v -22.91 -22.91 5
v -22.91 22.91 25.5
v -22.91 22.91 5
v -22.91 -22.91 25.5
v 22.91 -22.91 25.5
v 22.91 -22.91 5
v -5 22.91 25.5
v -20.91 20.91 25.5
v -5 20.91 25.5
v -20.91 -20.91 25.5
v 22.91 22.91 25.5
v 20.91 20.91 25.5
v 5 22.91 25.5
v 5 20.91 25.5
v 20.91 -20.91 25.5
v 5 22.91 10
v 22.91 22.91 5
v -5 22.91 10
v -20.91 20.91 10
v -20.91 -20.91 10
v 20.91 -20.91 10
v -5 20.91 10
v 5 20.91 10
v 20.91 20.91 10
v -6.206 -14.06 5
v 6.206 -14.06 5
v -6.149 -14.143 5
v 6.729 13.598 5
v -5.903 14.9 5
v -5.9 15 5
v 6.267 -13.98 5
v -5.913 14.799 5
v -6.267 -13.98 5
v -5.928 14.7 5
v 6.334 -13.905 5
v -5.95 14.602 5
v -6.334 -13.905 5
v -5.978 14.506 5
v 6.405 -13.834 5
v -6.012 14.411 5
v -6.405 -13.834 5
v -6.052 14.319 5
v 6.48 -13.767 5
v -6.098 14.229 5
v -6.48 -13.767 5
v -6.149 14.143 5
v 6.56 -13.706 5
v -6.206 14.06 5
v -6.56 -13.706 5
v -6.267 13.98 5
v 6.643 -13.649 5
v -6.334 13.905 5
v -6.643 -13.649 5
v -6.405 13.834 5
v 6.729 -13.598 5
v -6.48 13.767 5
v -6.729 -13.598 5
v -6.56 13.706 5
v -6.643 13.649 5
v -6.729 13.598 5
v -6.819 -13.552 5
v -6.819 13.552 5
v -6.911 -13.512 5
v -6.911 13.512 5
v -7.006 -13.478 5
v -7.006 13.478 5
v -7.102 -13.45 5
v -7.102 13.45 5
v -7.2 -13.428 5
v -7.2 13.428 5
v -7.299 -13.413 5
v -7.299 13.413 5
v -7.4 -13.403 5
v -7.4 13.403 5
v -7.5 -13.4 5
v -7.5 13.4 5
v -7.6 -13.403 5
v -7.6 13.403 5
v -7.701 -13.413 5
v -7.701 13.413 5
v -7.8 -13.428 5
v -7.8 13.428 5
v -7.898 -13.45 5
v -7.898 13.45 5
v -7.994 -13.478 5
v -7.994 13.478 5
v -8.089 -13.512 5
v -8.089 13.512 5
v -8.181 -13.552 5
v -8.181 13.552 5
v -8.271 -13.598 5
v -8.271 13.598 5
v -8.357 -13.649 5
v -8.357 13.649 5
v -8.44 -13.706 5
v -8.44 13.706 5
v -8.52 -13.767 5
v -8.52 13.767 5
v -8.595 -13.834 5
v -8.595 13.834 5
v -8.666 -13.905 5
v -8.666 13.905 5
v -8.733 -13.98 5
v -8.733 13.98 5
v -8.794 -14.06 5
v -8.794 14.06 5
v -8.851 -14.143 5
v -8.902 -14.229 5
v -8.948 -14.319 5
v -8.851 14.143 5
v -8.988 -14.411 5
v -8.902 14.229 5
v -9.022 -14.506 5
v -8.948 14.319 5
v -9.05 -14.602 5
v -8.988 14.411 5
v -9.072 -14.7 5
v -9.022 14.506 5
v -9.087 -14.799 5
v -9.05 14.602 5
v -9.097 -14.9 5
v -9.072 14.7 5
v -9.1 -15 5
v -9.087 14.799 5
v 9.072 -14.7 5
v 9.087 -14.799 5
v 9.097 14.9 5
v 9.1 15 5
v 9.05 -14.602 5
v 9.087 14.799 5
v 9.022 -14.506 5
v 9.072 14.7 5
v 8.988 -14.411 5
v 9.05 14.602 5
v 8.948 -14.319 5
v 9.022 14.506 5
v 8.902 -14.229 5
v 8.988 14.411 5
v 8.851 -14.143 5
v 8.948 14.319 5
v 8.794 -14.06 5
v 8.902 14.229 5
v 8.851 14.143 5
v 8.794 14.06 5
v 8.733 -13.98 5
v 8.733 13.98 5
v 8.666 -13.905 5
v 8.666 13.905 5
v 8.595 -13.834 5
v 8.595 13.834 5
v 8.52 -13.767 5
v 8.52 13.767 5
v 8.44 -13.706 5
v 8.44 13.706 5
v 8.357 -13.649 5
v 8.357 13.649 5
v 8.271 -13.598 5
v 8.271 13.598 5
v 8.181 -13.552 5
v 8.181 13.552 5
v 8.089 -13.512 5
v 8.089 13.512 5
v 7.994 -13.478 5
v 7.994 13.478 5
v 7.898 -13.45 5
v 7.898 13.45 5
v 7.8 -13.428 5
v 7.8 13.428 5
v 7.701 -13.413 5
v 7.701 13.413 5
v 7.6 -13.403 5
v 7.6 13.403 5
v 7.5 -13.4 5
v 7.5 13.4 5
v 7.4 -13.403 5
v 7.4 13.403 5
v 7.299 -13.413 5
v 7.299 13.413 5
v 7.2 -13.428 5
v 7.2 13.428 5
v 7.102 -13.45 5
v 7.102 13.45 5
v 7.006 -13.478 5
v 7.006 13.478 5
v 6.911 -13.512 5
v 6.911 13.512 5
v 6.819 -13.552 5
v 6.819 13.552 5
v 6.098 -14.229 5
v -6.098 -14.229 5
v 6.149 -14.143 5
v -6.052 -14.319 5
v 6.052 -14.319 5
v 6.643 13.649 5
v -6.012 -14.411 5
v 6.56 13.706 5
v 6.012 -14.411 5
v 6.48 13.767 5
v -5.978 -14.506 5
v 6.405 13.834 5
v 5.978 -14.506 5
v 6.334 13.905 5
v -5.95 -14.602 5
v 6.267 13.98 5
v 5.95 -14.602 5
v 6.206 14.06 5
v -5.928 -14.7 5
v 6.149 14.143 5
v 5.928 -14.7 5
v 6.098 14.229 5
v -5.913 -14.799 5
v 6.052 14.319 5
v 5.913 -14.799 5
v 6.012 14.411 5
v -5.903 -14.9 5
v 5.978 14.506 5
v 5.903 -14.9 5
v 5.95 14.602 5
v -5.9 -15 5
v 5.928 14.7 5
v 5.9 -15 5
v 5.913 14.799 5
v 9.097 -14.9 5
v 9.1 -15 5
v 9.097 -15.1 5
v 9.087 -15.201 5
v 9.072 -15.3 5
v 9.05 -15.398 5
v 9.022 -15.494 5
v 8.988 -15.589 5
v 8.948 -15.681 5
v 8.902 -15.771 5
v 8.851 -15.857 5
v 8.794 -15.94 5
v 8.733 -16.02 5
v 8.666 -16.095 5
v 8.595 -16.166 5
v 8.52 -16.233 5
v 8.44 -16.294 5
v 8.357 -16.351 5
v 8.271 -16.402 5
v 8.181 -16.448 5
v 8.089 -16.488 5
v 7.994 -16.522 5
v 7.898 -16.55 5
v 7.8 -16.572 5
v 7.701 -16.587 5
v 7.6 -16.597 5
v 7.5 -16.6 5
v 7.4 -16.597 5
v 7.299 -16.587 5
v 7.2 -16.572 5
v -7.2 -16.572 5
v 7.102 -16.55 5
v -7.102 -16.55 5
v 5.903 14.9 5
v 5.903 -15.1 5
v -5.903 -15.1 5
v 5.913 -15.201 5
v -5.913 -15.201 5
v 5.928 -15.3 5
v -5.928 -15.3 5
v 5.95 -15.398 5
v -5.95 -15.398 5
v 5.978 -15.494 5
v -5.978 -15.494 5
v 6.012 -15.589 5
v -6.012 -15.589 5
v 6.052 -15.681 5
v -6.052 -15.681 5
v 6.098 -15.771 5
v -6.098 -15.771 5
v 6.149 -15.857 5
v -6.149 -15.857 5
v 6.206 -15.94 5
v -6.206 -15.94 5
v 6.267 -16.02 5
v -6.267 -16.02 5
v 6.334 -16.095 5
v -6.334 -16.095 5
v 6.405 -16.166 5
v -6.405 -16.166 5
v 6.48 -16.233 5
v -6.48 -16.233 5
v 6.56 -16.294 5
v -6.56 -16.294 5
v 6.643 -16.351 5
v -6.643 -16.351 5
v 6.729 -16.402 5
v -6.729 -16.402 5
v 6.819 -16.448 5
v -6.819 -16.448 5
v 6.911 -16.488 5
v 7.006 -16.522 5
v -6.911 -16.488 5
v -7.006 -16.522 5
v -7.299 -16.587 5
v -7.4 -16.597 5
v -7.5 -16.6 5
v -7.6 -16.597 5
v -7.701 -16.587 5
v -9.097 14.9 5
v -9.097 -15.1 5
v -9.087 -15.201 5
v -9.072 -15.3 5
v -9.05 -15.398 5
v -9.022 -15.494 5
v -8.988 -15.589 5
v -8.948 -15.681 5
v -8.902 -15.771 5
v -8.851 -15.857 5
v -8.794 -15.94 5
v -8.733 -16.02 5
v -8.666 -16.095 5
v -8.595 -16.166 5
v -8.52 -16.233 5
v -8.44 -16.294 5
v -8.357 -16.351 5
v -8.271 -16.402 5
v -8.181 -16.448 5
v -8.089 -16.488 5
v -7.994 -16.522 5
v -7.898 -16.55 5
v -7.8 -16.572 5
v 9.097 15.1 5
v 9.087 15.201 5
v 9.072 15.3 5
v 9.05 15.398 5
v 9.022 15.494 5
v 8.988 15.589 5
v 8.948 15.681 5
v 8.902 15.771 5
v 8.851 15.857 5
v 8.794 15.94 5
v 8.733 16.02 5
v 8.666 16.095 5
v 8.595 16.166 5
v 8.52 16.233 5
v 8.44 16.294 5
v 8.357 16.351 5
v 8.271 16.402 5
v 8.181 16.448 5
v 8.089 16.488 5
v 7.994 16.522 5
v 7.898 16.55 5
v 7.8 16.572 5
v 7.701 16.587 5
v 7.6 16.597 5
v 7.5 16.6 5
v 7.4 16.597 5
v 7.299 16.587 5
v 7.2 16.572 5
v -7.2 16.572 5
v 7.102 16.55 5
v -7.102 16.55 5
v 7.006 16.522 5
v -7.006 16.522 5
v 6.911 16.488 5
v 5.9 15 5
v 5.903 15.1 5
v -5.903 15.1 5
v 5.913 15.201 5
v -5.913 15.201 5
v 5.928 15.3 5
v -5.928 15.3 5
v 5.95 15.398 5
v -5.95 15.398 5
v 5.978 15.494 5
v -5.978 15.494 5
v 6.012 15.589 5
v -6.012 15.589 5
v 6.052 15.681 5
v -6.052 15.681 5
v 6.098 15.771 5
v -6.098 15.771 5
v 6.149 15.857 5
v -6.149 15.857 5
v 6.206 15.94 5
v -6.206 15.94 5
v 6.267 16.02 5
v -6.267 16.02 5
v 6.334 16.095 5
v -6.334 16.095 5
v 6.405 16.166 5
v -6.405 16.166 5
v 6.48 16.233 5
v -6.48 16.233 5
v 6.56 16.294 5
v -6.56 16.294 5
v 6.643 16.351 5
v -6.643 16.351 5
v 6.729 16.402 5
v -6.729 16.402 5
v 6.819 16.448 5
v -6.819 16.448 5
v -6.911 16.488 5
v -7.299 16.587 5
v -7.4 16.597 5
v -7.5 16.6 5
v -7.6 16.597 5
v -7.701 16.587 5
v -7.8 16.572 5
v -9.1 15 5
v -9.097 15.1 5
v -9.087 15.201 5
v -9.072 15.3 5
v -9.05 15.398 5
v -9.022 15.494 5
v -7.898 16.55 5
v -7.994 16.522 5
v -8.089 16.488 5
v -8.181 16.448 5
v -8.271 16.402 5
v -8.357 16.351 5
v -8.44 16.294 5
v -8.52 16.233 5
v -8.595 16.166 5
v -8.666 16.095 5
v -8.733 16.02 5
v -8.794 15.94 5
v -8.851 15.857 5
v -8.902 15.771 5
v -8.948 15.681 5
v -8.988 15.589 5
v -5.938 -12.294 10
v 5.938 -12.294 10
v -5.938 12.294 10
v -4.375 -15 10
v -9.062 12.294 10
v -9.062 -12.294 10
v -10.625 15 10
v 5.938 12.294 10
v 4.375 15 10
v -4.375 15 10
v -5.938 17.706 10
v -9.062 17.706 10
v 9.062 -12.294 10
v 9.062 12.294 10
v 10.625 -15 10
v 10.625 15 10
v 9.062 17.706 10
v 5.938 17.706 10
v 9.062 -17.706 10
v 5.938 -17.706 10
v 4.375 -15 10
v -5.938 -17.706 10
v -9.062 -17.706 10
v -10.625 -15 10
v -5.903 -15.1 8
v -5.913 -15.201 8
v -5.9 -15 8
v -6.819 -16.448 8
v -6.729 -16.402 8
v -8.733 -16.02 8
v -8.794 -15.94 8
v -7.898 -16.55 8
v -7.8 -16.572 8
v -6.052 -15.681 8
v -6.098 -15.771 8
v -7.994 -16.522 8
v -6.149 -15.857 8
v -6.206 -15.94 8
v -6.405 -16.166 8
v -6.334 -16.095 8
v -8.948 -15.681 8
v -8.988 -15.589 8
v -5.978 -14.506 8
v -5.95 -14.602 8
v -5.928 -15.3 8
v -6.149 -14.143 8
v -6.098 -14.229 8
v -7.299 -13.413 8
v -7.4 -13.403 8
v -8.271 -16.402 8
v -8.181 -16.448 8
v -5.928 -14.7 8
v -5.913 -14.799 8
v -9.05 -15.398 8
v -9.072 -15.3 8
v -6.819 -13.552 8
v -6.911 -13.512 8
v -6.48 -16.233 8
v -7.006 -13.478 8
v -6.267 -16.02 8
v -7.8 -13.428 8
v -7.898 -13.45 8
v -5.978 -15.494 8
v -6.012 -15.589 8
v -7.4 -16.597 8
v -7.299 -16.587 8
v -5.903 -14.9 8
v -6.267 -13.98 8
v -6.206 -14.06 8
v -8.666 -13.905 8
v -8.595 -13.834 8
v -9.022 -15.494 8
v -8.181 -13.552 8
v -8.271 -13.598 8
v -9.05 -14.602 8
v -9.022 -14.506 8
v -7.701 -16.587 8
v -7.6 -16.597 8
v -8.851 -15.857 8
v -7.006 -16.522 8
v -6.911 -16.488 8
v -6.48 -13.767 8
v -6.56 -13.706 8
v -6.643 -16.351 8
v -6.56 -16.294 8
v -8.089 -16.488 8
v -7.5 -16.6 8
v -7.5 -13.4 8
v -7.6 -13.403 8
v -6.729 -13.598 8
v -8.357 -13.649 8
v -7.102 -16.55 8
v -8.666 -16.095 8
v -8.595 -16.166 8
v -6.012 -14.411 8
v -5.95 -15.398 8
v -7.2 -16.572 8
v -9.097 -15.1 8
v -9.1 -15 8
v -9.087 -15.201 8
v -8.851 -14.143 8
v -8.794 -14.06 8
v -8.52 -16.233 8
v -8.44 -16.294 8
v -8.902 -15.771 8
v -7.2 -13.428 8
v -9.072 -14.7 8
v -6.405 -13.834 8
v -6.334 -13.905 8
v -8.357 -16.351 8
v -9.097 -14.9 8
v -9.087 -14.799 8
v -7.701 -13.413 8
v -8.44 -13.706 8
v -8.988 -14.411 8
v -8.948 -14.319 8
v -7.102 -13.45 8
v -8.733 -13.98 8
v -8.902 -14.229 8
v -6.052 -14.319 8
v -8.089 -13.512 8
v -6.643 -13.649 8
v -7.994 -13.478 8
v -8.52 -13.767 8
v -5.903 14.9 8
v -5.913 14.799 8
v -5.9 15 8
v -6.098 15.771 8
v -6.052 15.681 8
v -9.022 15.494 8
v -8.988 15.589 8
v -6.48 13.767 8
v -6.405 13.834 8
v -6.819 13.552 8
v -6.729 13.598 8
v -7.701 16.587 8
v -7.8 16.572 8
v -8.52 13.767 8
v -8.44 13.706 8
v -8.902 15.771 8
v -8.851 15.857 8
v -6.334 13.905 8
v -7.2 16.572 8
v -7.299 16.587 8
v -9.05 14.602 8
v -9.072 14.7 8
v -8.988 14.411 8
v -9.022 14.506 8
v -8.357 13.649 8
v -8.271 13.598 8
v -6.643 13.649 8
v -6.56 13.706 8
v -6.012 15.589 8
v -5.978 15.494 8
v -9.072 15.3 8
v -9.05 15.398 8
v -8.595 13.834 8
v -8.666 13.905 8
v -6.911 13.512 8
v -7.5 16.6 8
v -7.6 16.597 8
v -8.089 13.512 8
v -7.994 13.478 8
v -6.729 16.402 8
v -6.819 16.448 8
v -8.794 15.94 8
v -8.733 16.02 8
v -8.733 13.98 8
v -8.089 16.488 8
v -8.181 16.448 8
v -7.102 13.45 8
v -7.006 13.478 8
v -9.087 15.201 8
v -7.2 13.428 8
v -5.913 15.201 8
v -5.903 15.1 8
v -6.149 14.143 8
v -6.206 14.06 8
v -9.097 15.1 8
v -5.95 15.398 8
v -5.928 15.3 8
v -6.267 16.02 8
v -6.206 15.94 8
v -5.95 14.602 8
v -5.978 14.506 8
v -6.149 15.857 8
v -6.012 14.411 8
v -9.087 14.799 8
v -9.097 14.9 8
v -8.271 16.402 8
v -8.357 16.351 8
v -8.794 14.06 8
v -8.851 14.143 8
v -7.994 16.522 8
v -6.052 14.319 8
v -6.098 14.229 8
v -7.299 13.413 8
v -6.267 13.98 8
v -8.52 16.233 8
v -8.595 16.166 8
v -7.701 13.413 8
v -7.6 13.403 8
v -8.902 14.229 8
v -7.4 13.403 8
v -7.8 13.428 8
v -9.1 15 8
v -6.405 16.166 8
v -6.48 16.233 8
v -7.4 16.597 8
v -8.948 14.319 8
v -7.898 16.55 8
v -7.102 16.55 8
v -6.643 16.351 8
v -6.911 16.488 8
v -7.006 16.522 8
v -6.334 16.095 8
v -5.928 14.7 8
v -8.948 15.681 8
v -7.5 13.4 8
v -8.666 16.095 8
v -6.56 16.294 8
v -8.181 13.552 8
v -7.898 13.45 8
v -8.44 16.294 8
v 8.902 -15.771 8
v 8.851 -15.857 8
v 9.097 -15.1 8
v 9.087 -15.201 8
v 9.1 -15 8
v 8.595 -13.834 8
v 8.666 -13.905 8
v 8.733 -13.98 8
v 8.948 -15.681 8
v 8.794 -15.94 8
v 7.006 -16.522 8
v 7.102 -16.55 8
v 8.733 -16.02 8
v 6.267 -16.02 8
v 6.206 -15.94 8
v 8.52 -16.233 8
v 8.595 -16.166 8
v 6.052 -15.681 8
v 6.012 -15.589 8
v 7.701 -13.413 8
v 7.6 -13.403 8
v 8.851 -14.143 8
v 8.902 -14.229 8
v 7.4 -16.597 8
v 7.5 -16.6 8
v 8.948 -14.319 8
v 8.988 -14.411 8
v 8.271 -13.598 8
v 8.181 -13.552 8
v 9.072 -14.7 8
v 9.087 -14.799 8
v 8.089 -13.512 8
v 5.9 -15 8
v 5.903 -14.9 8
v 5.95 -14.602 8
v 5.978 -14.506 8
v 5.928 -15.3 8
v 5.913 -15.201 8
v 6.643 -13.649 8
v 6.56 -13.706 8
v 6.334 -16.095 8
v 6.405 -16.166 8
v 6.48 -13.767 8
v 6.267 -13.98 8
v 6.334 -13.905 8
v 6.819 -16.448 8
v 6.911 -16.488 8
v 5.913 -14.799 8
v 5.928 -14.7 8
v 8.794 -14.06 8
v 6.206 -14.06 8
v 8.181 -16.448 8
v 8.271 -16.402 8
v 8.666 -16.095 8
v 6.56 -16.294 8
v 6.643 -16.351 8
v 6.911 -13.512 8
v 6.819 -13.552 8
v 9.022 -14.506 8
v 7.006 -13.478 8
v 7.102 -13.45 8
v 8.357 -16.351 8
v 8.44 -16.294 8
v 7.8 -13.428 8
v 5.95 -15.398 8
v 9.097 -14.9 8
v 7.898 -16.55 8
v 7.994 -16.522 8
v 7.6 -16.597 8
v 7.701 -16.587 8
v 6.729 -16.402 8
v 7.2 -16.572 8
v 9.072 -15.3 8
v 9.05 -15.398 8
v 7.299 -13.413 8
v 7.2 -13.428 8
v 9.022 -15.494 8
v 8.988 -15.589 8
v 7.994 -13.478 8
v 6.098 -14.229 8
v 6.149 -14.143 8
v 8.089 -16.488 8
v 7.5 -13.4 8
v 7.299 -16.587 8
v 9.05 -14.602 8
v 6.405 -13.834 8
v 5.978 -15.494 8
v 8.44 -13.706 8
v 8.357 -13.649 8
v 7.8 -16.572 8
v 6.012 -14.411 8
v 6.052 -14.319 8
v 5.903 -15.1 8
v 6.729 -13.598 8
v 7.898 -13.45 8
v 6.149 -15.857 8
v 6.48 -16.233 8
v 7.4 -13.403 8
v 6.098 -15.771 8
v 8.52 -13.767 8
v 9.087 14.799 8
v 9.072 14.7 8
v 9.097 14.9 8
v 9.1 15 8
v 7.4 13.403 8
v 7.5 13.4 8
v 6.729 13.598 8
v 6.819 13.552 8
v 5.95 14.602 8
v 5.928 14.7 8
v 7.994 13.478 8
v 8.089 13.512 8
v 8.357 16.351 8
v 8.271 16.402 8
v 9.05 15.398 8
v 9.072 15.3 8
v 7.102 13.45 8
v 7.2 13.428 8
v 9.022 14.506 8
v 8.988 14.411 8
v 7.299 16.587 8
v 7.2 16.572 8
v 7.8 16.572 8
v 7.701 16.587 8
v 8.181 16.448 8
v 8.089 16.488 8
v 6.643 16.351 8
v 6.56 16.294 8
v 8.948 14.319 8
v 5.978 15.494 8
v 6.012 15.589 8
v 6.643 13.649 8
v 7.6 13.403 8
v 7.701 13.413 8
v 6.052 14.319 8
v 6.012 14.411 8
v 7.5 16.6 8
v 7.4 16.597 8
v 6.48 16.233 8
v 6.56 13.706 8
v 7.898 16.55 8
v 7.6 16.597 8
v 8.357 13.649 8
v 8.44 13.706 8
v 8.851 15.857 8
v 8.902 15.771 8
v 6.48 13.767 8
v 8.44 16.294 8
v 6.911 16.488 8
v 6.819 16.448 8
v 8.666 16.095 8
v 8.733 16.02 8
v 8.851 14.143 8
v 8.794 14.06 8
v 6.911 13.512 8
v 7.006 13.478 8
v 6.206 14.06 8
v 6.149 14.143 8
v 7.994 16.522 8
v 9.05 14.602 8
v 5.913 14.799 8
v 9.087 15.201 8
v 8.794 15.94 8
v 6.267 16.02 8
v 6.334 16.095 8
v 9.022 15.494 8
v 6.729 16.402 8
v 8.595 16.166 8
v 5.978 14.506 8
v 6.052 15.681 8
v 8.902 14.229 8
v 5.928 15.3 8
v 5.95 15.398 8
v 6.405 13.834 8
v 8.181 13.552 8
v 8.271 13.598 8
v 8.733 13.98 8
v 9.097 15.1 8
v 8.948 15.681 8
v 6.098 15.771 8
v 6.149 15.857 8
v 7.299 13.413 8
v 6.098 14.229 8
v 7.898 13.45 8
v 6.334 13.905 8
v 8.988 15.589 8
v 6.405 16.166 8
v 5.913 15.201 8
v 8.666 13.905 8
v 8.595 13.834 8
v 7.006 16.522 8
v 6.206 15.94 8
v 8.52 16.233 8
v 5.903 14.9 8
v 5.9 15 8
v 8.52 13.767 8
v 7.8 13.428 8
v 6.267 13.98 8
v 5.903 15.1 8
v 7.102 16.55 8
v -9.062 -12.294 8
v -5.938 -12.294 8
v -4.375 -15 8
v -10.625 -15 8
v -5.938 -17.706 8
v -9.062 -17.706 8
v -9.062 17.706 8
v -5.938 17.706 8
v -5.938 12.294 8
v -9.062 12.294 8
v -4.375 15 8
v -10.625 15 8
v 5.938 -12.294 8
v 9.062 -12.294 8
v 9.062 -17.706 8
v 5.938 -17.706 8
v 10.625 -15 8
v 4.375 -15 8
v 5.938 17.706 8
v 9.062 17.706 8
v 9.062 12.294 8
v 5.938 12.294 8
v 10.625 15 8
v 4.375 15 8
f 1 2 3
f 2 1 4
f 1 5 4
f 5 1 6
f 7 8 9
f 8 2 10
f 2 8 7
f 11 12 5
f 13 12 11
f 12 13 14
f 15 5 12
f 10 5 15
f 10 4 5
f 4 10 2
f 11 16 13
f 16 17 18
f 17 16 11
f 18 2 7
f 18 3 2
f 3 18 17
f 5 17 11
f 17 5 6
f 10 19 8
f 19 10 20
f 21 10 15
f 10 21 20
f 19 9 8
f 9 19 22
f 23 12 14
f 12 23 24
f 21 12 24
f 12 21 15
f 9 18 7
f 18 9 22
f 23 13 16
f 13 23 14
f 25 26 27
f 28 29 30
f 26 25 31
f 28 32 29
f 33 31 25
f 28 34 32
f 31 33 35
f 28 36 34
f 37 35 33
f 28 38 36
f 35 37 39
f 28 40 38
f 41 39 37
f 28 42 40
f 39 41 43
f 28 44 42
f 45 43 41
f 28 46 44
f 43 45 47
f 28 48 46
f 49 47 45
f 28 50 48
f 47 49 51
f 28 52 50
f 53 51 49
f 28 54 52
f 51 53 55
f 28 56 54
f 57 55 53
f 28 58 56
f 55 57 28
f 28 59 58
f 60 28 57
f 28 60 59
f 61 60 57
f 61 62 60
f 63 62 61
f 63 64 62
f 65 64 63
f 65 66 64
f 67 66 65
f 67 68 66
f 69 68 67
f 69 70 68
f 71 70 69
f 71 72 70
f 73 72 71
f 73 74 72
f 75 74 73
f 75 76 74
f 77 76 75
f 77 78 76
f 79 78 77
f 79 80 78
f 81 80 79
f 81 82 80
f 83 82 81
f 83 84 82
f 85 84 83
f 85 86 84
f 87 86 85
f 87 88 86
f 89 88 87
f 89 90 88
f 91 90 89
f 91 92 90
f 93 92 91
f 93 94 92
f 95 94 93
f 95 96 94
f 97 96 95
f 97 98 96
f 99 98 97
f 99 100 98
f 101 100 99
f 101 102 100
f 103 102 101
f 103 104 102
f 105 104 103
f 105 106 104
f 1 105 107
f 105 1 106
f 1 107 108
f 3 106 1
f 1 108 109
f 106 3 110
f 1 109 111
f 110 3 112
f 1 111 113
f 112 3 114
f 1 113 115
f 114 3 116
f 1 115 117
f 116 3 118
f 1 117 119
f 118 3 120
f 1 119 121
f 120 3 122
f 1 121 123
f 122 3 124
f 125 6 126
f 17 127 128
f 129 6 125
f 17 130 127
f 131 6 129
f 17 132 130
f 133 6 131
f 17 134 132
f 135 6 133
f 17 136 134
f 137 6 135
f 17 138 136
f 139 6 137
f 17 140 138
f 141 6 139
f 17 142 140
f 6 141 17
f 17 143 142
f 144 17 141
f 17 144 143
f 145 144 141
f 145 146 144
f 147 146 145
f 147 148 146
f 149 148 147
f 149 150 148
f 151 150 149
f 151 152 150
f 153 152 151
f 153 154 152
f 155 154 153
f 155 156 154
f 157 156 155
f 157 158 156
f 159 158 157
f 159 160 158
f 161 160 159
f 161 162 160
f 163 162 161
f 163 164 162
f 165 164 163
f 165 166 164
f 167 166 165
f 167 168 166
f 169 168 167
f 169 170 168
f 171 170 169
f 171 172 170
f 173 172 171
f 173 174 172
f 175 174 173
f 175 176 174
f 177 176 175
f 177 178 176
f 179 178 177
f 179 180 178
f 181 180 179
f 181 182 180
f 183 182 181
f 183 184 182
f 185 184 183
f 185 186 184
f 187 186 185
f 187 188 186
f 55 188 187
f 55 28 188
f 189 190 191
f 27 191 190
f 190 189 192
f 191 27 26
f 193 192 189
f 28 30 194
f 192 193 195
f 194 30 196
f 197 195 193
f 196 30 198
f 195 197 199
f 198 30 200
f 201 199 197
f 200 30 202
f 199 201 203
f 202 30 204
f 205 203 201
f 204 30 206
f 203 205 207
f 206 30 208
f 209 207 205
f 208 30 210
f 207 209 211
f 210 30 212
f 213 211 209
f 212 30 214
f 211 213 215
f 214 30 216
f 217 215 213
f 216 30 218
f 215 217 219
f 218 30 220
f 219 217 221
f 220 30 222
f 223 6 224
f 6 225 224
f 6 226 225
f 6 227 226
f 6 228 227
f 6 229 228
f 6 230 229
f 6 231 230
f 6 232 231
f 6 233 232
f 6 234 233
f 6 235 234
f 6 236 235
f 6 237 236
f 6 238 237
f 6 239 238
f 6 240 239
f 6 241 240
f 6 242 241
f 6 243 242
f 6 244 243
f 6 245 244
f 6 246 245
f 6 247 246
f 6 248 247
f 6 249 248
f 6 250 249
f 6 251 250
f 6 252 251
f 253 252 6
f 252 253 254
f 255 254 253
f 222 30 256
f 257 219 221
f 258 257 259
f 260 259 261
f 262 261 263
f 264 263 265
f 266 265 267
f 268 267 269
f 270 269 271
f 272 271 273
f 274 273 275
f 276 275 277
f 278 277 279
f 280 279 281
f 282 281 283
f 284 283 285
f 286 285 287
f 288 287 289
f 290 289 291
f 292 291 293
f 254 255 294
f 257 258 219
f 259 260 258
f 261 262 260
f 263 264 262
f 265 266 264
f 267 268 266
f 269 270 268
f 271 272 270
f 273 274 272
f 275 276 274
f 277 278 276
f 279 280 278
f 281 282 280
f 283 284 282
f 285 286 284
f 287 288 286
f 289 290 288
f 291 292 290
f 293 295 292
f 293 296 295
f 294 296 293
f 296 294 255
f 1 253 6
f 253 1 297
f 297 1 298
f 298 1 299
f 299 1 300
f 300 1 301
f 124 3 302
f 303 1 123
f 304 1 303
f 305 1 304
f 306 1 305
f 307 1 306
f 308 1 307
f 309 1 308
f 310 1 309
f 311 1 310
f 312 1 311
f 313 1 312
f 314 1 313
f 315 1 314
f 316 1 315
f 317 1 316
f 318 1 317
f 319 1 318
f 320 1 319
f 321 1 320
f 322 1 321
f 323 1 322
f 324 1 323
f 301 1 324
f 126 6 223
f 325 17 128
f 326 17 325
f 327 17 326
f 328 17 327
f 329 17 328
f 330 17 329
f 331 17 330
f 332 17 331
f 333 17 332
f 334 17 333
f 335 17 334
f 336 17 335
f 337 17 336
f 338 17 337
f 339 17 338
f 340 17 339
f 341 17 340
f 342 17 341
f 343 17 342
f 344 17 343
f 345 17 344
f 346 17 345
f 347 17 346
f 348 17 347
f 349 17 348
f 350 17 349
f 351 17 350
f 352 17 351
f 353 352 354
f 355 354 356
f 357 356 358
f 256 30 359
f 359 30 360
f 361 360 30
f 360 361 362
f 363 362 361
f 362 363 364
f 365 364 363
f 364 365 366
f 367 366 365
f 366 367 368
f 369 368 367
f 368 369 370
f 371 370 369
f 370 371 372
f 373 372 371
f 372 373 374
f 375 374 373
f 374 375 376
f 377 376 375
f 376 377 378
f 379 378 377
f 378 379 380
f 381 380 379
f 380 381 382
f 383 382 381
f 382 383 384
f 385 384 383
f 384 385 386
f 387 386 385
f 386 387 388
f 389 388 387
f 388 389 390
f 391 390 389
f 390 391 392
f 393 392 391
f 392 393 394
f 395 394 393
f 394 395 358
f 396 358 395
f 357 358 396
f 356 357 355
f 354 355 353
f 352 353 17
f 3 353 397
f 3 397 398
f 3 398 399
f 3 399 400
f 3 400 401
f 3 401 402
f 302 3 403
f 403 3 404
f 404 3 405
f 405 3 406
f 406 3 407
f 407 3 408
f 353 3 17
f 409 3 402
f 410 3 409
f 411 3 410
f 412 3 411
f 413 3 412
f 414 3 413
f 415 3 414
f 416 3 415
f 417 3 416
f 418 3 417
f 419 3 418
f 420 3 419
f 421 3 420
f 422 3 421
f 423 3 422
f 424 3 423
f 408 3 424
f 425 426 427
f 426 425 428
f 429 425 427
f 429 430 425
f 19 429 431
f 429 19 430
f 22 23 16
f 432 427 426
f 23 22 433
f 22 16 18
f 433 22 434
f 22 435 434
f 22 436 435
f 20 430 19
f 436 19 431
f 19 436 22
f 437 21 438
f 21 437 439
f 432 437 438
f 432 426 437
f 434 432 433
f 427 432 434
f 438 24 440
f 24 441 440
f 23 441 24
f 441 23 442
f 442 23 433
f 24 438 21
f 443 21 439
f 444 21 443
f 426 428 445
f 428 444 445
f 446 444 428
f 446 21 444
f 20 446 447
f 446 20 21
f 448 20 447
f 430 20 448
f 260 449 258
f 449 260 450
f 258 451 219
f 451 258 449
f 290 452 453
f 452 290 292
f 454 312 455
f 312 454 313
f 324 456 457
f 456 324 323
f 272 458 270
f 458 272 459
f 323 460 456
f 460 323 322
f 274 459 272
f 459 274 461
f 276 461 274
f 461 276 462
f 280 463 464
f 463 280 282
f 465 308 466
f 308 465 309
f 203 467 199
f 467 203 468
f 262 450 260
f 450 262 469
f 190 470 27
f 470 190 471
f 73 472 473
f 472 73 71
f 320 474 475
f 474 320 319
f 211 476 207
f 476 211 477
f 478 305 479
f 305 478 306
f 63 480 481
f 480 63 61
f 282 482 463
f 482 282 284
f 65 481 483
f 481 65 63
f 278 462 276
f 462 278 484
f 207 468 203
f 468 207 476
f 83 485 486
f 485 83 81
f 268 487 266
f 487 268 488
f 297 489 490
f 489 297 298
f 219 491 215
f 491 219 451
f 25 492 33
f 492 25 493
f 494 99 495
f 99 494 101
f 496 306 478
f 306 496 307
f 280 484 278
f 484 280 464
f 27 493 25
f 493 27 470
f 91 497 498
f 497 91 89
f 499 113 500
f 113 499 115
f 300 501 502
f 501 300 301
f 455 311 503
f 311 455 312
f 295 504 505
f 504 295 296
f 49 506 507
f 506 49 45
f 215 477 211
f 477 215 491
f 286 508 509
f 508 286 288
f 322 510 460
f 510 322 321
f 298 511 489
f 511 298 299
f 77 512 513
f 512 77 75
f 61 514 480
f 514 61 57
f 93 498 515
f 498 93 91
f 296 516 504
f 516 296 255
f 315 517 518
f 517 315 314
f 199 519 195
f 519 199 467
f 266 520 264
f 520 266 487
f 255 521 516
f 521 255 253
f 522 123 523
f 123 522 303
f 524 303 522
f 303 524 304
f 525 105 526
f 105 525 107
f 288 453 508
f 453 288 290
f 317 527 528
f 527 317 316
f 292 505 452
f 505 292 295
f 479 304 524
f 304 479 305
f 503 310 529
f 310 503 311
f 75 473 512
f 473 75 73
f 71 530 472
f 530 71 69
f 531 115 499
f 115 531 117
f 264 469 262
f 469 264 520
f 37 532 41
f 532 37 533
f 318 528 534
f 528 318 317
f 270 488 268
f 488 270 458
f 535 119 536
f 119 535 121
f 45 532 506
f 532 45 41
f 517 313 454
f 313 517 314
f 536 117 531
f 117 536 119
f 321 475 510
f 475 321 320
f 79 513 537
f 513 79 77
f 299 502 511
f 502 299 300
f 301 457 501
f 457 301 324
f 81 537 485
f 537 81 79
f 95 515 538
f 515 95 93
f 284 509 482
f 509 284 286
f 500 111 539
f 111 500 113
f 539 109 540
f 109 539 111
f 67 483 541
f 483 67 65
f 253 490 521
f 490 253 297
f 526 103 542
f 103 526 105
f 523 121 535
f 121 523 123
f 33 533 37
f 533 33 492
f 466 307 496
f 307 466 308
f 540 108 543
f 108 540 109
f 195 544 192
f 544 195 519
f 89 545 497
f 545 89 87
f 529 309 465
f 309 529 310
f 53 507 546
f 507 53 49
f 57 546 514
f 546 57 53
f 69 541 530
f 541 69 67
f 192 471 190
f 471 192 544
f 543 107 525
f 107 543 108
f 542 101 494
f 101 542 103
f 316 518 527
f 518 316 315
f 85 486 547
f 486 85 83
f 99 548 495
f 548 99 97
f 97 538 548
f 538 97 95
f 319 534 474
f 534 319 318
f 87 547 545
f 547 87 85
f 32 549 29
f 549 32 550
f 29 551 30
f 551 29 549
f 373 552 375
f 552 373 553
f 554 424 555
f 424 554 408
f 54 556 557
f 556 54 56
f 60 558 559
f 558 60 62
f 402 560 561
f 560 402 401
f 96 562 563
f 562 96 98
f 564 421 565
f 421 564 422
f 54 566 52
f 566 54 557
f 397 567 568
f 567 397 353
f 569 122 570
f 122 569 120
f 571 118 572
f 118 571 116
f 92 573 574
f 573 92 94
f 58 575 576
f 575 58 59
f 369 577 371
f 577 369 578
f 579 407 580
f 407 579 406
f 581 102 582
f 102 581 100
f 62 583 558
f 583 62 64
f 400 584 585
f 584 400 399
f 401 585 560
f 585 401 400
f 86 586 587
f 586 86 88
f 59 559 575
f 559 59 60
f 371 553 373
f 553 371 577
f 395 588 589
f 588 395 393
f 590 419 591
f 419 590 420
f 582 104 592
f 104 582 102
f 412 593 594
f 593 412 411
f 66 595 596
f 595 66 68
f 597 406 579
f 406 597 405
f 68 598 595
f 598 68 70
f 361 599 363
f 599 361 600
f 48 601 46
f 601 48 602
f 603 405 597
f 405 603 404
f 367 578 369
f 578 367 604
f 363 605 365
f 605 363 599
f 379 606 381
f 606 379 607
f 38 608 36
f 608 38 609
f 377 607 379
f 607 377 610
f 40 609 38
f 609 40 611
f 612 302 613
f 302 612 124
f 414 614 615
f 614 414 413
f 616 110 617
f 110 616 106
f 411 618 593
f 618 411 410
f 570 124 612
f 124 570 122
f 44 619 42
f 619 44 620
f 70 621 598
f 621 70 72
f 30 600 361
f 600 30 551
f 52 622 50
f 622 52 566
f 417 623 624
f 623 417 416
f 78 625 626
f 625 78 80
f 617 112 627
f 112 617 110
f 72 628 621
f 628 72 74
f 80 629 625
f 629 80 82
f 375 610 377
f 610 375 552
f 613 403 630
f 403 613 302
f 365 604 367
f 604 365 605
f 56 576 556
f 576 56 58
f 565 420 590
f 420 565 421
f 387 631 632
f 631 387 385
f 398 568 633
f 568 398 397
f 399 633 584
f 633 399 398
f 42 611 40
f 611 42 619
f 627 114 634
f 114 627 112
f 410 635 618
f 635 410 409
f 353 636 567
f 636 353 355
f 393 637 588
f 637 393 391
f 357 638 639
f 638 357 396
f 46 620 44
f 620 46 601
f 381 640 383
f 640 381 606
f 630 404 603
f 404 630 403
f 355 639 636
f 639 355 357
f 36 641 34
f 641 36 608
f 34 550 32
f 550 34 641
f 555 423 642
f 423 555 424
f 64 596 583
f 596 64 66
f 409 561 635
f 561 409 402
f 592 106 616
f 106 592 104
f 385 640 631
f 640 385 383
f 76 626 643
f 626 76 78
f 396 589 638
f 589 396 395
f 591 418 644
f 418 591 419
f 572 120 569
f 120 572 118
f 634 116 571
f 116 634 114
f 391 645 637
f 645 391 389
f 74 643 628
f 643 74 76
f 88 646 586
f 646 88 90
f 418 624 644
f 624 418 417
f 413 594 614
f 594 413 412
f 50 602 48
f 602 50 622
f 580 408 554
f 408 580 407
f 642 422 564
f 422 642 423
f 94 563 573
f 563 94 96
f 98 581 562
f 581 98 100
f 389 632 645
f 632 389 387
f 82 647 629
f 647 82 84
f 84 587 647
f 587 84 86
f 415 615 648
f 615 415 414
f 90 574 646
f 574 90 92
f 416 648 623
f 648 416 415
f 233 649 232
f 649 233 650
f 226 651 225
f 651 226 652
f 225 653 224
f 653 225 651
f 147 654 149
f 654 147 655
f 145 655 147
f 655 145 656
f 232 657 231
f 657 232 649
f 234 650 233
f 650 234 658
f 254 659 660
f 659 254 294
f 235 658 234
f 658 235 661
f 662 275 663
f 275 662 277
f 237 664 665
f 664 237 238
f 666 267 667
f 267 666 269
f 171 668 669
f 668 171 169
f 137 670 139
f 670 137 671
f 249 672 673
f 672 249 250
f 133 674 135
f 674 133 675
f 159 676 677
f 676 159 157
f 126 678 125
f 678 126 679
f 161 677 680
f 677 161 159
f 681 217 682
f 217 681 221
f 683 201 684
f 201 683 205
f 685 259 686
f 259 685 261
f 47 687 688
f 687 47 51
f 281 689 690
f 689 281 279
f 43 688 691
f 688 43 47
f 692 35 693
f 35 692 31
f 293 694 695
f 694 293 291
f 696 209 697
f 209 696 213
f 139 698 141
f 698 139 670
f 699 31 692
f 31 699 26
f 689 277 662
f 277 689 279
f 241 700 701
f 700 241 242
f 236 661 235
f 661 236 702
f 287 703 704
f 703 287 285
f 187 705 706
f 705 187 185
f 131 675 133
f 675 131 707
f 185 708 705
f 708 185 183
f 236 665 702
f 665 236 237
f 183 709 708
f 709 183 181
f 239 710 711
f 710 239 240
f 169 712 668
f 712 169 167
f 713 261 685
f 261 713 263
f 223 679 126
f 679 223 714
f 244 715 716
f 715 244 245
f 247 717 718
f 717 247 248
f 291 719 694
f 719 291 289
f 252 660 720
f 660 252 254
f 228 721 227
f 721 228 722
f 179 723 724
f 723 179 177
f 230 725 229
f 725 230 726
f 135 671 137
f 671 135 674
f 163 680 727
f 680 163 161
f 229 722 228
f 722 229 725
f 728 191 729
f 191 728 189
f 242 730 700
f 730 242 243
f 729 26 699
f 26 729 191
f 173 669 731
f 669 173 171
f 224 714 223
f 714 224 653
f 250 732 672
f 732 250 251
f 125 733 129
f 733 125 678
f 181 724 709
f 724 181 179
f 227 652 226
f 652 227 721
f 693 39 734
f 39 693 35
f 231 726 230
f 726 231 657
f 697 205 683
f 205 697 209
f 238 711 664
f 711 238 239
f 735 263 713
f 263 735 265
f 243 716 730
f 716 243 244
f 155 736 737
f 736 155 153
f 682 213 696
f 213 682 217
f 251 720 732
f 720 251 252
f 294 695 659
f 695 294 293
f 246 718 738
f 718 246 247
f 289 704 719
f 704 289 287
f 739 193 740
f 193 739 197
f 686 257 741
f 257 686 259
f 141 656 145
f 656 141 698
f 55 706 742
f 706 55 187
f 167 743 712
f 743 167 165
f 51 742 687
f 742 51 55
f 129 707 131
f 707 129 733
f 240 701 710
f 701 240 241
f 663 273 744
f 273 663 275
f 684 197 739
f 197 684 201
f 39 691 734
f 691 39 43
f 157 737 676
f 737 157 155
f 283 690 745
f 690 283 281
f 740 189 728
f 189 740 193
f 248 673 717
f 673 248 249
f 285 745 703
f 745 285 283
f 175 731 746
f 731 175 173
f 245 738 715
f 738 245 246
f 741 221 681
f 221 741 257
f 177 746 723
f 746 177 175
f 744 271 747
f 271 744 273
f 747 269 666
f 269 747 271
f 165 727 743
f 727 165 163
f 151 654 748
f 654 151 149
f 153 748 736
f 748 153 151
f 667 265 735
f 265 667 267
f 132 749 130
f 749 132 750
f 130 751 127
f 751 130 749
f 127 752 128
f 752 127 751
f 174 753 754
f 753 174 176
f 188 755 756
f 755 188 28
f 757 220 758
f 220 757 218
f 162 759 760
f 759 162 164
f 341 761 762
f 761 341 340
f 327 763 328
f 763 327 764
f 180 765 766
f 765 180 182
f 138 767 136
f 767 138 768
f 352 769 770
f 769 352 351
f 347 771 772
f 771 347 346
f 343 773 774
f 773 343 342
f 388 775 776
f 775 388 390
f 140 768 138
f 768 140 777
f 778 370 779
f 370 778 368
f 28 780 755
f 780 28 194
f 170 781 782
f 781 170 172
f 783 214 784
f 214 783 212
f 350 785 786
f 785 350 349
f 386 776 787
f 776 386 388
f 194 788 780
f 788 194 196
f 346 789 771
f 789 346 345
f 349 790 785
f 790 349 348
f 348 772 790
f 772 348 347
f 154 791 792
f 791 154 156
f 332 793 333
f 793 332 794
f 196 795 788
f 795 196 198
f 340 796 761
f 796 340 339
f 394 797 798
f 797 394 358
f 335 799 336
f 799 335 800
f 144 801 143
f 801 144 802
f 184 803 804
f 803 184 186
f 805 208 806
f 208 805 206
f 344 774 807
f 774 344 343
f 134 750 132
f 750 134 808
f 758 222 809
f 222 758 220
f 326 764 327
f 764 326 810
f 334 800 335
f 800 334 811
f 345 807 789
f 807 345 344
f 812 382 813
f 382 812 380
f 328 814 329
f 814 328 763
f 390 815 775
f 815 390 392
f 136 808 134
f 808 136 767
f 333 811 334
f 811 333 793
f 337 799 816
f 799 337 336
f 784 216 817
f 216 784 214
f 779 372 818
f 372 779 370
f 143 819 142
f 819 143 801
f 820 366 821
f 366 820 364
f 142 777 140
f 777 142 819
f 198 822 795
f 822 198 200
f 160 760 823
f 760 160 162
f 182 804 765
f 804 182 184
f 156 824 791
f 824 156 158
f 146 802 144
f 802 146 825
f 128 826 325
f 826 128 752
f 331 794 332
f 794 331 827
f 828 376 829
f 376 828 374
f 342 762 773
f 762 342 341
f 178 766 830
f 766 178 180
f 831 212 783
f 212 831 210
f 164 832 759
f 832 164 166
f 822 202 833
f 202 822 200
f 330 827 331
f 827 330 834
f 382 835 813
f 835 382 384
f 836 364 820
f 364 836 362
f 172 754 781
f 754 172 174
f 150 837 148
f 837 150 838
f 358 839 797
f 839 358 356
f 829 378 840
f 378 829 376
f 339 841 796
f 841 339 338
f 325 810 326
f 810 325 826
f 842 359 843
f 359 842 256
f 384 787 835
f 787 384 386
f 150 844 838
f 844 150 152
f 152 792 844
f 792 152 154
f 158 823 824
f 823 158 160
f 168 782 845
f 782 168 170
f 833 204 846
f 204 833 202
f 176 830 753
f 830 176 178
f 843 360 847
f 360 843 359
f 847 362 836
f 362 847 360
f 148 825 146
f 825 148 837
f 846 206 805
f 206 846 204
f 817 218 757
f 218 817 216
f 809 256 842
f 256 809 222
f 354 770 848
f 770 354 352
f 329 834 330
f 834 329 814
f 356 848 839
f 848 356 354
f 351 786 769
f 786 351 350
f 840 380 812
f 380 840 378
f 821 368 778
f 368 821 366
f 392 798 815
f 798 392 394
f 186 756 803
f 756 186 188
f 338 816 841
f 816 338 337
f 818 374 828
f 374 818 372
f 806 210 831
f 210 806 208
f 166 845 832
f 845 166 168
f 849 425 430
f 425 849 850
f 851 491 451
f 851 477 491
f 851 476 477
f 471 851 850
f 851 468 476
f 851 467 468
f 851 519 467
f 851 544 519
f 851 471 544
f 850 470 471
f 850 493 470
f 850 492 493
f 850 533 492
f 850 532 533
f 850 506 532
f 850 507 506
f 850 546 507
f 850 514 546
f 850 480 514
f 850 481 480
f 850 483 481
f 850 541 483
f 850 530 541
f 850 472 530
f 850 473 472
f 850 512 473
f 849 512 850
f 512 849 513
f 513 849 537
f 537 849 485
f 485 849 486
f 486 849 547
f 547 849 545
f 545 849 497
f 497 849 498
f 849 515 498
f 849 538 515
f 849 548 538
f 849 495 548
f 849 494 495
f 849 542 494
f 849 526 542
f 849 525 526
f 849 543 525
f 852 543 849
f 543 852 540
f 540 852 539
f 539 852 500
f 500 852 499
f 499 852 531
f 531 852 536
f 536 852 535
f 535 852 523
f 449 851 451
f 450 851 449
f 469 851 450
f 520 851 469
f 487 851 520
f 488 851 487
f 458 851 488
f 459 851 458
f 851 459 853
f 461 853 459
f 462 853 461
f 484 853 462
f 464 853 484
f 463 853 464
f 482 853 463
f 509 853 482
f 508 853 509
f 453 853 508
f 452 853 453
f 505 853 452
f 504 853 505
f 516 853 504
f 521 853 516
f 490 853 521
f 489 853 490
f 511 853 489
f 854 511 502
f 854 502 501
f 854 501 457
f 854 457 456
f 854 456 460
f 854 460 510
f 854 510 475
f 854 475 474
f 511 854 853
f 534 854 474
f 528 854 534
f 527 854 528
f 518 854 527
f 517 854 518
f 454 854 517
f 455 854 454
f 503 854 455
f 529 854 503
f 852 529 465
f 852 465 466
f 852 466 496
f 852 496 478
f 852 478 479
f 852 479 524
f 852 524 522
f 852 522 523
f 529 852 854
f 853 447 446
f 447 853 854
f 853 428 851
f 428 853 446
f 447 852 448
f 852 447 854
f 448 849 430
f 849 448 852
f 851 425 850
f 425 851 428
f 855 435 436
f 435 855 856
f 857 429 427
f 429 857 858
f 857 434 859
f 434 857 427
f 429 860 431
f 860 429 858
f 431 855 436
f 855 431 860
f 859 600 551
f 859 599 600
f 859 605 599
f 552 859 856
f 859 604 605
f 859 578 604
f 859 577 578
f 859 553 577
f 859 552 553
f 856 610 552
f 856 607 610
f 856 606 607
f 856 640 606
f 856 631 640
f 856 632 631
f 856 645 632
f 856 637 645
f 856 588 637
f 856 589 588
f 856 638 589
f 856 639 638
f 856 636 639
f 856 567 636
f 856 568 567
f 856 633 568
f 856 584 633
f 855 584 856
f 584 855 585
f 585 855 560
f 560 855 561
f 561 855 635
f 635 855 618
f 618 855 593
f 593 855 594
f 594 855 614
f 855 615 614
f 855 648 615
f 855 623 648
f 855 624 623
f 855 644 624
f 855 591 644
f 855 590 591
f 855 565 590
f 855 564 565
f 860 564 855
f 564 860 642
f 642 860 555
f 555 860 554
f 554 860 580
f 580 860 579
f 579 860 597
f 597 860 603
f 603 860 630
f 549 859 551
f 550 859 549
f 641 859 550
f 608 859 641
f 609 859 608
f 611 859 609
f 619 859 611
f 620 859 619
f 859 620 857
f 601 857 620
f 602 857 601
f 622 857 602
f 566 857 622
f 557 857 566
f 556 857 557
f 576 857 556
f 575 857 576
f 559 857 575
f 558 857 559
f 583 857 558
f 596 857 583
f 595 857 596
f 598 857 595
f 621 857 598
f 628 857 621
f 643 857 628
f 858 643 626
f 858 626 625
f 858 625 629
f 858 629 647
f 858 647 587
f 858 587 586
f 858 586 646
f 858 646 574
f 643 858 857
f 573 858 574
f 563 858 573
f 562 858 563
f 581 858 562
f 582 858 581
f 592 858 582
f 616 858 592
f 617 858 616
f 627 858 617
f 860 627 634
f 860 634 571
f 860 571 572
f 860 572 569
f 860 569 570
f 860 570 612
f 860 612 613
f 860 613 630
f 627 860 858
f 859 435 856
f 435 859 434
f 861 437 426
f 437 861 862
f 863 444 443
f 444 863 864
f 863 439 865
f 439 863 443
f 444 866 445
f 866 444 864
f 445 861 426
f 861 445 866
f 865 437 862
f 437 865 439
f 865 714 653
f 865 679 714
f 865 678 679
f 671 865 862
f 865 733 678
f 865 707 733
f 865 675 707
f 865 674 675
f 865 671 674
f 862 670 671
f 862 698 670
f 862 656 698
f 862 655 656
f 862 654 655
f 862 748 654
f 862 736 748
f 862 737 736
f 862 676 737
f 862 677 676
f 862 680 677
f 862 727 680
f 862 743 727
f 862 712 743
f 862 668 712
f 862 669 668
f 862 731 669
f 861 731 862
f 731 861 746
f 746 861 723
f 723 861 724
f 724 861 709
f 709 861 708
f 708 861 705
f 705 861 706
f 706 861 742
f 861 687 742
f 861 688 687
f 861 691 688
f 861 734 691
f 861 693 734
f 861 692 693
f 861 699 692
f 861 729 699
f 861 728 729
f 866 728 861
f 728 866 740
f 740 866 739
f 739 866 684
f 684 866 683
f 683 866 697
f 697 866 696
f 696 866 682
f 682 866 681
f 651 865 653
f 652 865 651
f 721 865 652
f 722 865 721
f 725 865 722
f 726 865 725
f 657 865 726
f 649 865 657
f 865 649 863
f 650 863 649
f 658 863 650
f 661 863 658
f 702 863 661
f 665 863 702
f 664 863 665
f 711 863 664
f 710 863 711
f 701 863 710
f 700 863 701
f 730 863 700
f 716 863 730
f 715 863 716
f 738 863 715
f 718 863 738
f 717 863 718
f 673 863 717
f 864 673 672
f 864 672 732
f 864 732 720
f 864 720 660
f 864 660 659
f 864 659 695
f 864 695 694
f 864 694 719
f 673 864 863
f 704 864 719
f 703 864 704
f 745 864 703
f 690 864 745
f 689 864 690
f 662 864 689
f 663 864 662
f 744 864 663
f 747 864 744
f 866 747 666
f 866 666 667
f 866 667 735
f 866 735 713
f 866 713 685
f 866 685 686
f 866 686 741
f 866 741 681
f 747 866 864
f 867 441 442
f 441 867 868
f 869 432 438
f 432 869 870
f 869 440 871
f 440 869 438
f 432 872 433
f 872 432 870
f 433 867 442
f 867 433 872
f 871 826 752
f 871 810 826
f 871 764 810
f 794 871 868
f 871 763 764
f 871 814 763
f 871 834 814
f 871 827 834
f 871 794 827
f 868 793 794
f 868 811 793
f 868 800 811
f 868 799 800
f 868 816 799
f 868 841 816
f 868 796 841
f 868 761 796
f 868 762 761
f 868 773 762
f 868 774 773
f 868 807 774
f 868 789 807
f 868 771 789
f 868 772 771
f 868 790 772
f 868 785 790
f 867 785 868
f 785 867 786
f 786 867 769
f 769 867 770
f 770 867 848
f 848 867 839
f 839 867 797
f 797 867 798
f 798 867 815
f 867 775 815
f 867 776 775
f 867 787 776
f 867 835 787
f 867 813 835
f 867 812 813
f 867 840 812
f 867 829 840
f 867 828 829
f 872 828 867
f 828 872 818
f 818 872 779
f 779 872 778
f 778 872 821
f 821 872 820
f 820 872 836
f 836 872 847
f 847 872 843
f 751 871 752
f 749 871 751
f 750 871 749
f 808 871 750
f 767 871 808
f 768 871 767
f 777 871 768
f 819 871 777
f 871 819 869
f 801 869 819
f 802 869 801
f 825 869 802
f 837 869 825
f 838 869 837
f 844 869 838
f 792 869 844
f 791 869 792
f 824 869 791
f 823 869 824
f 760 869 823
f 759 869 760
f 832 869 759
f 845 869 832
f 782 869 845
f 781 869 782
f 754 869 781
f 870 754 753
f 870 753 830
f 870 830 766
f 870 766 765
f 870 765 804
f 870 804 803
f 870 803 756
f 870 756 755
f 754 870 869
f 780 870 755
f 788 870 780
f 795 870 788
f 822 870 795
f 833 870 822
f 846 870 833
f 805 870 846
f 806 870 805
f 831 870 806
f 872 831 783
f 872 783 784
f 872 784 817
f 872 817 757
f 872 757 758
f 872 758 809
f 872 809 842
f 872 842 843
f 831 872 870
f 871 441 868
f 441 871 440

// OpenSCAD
$fn=100;
nema = 41.82;
wall = 4;

/**
 * Holder for nema17 stepper motor body.
*/
module nema17() {
  union() {
    difference() {
    //outer shell
    rotate([180,-90,0]) translate([0,0,5]) cube ([nema+wall,nema+wall,20], center=true);
    //nema
    rotate([180,-90,0]) cube ([nema,nema,nema], center=true);
    //relief
    rotate([180,-90,0])  translate([0,-(nema+wall)/2,0]) cube([10, 7, 60], center=true);
    }
    //cover
    translate([13,0,0]) cube ([wall+1,nema+wall,nema+wall], center=true);
  }
}
/**
 * Nut traps for pen holder.
*/
module trap() {
 rotate([180,-90,0]) cylinder (d=6.25, h=4.5,Center=true, $fn=6);
}
/**
 * Screw for pen holder.
*/
module screw() {
     rotate([180,-90,0]) cylinder (d=3.2, h=30,Center=true);
}
/**
 * Screw and nut traps for pen holder.
*/
module holes() {
    //screw holes
    //top right
    translate([0,-15,-7.5]) screw();
    //bottom right
    translate([0,15,-7.5]) screw();
    //top left
    translate([0,-15,7.5]) screw();
     //bottom left
    translate([0,15,7.5]) screw();
    //nut traps
    //top right
    translate([8,-15,-7.5]) trap();
    //bottom right
    translate([8,15,-7.5]) trap();
    //top left
    translate([8,-15,7.5]) trap();
    //bottom left
    translate([8,15,7.5]) trap();
    }
/**
 * Relatively universal tool holder.
*/
module assembly() {
difference() {
      nema17();
      holes();
}
    }
/**
 * Alignment for printing.
*/
 translate([0,0,20.5]) rotate([0,90,0]) assembly();
